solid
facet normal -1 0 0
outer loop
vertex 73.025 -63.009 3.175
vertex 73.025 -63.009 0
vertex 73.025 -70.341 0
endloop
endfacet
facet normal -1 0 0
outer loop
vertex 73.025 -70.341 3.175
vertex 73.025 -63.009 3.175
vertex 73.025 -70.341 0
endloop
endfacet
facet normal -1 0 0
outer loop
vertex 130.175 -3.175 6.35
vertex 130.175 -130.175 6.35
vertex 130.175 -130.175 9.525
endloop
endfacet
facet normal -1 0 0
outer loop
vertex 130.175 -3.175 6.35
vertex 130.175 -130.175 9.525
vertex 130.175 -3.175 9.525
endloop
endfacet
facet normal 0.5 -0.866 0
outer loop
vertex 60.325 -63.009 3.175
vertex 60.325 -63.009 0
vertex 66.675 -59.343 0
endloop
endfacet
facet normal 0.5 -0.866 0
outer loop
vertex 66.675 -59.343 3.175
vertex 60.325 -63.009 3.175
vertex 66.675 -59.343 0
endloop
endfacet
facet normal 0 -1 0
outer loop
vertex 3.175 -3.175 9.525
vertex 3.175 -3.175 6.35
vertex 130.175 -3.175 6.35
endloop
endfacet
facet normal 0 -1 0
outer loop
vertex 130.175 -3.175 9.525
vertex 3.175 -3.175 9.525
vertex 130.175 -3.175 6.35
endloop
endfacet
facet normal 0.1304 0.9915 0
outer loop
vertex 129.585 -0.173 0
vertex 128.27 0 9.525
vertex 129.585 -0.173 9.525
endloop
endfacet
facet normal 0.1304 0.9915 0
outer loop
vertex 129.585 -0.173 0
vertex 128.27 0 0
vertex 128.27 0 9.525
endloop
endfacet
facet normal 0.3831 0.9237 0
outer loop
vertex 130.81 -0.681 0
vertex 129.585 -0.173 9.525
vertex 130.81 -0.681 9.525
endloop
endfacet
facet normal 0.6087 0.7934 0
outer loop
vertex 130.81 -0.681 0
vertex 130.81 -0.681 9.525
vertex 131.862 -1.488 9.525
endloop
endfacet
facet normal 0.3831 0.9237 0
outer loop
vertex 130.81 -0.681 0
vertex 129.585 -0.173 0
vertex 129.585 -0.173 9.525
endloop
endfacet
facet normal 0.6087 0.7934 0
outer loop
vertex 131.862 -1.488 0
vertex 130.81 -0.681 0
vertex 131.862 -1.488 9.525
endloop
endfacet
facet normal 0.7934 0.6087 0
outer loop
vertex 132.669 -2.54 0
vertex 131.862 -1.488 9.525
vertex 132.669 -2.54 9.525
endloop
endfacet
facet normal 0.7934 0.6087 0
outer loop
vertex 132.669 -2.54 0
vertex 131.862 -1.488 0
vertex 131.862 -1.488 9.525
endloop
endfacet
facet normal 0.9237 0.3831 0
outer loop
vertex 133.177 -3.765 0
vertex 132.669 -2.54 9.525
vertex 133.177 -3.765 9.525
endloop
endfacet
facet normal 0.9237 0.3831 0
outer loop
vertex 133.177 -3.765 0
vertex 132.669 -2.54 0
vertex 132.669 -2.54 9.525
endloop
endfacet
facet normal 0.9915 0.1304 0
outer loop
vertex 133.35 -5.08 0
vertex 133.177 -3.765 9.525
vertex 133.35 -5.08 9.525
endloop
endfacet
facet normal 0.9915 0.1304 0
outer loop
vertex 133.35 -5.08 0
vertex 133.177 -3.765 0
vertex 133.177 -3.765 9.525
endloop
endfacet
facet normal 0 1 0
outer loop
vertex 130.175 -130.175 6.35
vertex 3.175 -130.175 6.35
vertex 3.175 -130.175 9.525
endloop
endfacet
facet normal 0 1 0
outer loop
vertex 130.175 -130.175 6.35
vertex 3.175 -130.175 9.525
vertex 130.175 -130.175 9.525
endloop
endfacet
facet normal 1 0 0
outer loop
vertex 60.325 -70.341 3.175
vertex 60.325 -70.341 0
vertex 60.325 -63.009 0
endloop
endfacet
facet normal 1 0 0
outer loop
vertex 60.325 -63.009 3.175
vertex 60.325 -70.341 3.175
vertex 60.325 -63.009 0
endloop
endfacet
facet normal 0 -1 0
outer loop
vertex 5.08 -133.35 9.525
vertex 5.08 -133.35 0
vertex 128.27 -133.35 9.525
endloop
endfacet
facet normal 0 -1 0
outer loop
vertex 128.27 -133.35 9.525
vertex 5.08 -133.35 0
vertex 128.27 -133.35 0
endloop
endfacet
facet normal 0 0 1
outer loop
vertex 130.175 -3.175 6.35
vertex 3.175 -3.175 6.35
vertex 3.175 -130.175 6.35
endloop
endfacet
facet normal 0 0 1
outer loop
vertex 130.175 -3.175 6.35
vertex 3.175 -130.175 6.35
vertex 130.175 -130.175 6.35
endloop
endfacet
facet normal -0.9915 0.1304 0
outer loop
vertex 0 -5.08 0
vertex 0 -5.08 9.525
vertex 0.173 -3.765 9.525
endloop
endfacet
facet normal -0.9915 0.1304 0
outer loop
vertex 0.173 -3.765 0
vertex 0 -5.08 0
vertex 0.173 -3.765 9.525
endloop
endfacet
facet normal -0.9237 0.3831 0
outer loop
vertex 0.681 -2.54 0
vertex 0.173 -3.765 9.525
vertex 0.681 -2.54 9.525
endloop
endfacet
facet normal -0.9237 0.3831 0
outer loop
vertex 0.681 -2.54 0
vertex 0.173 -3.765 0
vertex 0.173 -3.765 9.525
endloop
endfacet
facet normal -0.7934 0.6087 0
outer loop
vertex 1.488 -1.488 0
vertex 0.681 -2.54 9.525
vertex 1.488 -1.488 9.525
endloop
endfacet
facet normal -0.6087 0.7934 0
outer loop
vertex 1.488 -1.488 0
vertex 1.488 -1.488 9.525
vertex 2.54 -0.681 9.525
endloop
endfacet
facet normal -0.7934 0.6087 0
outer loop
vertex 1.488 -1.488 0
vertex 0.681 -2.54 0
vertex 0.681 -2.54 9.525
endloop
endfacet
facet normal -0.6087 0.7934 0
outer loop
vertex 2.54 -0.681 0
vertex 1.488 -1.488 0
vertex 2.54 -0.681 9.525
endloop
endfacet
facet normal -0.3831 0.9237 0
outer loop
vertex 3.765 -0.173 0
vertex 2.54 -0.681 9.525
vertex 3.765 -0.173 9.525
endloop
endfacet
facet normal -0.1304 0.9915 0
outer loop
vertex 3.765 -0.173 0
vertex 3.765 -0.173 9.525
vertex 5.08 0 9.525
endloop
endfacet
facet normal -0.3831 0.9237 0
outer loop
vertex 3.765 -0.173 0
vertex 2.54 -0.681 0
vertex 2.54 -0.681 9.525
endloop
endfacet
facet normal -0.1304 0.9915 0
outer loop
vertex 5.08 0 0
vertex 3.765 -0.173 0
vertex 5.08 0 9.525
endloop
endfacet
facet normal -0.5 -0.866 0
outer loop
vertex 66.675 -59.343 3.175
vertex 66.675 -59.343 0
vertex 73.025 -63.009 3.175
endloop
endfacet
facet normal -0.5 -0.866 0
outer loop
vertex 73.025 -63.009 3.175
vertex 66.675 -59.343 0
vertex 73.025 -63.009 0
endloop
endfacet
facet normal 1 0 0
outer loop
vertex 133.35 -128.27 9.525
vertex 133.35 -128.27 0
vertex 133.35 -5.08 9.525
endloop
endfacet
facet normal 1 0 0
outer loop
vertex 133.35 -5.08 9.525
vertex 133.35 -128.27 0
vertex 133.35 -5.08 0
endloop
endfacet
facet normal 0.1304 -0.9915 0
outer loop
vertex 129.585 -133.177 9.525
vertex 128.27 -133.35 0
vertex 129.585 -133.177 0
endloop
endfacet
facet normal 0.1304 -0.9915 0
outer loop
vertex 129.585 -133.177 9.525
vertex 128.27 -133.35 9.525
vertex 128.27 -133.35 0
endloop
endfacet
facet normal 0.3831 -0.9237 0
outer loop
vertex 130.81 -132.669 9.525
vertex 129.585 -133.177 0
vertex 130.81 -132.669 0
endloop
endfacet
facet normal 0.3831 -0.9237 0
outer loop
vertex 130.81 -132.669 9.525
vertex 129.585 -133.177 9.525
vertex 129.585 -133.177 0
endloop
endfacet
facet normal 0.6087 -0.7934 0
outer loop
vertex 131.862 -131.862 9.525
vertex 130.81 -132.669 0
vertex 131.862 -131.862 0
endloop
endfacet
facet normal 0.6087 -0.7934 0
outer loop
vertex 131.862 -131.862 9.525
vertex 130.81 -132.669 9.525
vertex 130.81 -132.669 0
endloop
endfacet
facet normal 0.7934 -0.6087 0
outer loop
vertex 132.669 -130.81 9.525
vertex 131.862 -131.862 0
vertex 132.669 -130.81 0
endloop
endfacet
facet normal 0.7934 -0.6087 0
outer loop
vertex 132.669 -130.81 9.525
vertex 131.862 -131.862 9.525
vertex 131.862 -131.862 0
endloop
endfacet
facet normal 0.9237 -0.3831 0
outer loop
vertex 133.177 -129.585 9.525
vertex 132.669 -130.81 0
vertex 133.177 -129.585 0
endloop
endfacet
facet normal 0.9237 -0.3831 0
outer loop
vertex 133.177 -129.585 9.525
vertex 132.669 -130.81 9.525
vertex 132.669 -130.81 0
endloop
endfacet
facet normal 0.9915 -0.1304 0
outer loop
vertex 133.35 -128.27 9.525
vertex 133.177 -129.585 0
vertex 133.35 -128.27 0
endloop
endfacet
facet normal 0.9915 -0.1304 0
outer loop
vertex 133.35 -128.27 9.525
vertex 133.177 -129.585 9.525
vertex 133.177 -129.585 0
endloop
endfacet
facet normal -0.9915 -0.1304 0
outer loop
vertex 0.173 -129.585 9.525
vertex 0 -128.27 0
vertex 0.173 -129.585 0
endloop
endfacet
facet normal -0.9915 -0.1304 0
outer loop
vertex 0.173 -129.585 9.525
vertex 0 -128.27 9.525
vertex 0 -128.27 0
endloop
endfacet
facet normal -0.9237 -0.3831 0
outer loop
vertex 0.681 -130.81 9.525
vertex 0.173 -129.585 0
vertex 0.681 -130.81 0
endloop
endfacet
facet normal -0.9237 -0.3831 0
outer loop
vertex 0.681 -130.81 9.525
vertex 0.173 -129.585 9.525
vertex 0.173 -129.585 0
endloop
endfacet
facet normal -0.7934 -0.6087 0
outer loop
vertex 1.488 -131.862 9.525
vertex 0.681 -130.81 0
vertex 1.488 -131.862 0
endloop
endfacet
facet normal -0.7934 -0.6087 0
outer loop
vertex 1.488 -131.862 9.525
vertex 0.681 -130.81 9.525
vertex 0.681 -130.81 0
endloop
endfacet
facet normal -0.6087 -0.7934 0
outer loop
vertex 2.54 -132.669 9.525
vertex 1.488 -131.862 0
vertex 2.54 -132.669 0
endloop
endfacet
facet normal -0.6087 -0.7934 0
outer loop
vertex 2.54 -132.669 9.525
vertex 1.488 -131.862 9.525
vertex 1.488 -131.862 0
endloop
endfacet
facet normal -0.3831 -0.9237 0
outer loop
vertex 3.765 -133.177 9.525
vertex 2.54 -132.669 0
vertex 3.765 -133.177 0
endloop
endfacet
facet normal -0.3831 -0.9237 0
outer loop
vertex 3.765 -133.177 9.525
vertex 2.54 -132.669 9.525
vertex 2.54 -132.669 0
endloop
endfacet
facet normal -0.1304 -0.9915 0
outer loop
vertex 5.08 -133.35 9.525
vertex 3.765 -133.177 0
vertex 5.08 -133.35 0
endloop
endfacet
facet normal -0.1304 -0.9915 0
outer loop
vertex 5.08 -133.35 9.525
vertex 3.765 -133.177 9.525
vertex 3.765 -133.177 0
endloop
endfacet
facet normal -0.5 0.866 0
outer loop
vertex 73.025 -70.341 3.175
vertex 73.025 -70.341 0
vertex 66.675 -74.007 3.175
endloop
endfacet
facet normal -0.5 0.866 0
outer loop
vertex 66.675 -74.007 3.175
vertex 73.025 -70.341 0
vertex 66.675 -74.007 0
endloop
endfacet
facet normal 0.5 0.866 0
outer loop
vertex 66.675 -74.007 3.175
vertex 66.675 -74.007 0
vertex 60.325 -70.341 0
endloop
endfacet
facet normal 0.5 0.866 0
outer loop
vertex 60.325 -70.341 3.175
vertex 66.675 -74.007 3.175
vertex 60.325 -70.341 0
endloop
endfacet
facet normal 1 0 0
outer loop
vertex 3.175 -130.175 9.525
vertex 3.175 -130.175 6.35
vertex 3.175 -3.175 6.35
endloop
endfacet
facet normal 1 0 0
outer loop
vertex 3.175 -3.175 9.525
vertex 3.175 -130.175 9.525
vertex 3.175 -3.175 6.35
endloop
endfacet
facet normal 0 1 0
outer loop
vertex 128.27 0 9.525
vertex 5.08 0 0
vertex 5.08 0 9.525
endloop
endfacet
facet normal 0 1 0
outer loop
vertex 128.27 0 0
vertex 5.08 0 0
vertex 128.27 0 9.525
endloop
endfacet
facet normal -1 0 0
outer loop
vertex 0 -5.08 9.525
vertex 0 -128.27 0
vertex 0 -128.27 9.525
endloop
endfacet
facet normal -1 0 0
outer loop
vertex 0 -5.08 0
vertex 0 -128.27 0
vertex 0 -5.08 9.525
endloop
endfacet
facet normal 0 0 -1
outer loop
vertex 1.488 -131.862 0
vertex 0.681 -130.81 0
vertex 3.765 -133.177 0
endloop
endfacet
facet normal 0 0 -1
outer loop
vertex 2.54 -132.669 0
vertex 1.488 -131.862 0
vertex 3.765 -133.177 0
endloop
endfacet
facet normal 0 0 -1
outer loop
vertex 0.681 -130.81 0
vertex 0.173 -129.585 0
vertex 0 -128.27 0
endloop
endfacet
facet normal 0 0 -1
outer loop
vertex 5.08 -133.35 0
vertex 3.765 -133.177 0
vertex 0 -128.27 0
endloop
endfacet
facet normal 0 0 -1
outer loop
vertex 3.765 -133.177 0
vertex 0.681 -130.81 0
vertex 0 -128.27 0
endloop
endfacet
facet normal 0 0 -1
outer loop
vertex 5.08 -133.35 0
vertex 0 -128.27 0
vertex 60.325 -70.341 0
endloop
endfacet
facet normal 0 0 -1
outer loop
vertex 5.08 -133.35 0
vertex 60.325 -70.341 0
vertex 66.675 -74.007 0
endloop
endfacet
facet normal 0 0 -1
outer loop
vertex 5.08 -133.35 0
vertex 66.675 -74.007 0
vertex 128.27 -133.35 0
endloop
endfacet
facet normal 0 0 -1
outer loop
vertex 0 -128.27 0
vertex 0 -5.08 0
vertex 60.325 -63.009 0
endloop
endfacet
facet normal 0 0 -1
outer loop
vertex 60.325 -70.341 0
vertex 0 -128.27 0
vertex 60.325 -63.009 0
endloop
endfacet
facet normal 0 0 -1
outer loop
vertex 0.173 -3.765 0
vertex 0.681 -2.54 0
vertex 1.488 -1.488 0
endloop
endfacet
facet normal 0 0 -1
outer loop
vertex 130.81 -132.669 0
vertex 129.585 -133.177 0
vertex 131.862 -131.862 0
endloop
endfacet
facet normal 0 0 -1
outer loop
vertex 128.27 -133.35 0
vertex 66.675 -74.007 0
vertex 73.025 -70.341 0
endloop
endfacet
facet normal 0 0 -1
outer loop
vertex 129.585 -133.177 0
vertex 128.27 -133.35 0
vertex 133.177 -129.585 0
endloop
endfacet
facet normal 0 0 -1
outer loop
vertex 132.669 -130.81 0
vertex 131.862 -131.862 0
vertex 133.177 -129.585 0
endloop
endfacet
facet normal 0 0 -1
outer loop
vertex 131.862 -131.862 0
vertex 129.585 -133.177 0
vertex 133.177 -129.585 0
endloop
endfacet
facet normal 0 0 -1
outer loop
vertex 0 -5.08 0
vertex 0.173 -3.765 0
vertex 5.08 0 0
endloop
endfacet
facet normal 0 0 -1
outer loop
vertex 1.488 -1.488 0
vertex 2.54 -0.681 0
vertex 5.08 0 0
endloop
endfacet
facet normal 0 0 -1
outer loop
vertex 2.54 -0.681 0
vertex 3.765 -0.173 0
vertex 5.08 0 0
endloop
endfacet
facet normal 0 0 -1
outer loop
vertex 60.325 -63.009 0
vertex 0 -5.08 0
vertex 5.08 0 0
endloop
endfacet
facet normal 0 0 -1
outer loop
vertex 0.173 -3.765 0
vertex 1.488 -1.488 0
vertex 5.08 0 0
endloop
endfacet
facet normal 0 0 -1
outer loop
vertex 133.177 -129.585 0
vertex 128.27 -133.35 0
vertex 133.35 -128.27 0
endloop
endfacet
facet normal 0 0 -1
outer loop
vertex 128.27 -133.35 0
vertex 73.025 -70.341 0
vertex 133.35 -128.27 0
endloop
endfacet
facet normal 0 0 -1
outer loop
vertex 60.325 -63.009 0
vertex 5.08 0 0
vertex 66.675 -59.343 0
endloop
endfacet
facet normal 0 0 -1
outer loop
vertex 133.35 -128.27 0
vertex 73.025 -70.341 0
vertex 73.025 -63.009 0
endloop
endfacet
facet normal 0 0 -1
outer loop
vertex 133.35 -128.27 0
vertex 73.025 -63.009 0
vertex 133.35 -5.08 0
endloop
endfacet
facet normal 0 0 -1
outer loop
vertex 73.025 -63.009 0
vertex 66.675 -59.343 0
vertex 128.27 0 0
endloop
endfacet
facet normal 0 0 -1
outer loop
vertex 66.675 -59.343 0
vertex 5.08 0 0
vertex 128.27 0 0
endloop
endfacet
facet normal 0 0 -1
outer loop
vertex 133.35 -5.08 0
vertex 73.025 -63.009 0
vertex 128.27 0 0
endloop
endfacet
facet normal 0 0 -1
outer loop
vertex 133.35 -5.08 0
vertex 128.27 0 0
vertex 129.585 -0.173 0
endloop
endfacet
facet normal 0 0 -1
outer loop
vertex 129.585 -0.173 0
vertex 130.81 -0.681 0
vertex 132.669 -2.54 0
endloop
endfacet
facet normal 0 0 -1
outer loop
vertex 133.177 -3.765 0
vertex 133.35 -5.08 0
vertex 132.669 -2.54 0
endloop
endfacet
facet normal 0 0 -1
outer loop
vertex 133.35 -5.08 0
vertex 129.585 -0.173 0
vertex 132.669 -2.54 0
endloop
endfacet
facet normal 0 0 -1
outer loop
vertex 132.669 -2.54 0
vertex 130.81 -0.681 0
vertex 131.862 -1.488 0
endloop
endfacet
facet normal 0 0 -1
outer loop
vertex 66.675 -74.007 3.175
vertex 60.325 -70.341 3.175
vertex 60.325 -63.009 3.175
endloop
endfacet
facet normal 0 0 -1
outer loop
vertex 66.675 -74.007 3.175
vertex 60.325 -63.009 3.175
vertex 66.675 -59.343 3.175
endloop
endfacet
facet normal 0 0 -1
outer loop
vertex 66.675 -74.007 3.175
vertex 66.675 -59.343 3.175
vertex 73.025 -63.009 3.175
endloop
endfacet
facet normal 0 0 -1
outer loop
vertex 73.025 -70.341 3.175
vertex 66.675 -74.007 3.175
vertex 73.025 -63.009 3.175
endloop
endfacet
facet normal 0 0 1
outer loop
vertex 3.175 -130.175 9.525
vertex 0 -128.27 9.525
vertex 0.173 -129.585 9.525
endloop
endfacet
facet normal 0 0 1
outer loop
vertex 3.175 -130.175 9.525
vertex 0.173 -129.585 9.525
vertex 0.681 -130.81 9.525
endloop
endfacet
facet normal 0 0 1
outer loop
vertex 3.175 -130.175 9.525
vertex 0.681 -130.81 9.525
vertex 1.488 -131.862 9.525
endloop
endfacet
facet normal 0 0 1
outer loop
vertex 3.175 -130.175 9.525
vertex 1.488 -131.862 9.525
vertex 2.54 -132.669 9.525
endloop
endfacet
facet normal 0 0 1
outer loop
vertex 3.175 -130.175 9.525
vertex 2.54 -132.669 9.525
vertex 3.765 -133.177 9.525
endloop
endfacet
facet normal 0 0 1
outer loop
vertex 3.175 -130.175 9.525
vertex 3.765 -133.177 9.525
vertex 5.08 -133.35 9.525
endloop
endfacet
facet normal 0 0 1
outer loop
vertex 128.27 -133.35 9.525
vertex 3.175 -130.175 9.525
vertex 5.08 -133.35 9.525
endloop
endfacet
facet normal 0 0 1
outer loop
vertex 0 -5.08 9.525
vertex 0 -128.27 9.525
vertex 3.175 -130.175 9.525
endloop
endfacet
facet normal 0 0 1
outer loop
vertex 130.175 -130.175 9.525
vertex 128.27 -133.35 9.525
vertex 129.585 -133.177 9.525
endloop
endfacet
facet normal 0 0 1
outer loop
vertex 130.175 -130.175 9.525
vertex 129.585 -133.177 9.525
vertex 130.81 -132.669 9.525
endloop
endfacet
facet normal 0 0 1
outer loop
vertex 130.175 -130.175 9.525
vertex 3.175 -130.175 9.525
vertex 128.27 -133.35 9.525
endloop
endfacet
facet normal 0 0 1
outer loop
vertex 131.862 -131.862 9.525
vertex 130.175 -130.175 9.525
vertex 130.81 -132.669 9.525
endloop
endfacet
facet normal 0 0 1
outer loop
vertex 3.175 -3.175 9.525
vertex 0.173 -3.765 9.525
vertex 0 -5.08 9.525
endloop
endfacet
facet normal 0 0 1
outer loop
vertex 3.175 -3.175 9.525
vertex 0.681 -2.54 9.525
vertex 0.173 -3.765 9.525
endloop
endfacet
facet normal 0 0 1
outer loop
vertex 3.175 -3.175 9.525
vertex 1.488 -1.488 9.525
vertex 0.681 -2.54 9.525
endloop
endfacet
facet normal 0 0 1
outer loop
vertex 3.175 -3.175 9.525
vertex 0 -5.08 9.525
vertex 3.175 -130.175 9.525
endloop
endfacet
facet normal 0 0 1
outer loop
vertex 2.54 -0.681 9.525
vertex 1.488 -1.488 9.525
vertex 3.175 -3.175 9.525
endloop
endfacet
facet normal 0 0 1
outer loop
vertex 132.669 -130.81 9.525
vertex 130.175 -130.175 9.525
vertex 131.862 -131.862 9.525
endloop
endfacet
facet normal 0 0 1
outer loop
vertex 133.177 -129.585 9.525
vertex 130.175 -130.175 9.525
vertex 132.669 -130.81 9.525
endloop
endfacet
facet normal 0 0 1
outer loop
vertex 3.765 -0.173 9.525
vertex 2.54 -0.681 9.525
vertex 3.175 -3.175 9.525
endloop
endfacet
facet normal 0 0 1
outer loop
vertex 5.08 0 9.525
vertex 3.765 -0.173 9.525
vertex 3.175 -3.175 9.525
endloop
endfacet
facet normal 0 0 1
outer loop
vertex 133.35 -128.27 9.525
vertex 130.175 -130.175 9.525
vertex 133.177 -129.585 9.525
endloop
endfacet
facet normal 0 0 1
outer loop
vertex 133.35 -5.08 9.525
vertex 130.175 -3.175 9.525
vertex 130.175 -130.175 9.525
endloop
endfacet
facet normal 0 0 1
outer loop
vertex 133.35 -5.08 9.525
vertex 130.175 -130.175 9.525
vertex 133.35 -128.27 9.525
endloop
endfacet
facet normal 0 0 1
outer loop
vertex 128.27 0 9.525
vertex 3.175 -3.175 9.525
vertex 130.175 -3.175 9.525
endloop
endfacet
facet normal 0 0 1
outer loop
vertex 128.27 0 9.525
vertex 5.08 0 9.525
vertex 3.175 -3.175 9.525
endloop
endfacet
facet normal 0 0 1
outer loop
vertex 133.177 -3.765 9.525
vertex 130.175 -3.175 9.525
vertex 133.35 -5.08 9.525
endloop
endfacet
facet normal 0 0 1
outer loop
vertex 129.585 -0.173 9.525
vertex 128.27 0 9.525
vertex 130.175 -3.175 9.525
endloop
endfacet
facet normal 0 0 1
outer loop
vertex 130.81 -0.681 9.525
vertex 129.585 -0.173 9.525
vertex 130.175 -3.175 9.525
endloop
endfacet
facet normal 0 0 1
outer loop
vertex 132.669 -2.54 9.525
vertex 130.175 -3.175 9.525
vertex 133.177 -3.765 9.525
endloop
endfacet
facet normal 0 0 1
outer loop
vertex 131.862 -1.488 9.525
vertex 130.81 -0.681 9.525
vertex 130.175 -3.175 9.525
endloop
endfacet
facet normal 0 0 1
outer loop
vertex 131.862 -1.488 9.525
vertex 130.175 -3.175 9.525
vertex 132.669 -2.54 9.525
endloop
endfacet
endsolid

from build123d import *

# Parameters (mm, degrees)
F0_W     = 133.35
F0_H     = 133.35
F1_DEPTH = 6.35
F2_W     = 133.35
F2_H     = 133.35
F2_W_2   = 127
F2_H_2   = 127
F3_DEPTH = 3.175
F6_DEPTH = 3.175
F7_R     = 5.08


with BuildPart() as f1:
    # F0 (on Top) → F1 (new body)
    with BuildSketch(Plane.XY):
        with Locations((66.675, -66.675)):
            Rectangle(F0_W, F0_H)
    extrude(amount=F1_DEPTH)

    # F2 (on face) → F3 (join)
    with BuildSketch(Plane.XY.offset(6.35)):
        with Locations((66.675, -66.675)):
            Rectangle(F2_W, F2_H)
        with Locations((66.675, -66.675)):
            Rectangle(F2_W_2, F2_H_2, mode=Mode.SUBTRACT)
    extrude(amount=F3_DEPTH)

    # F5 (on face) → F6 (cut)
    with BuildSketch(Plane(origin=(0, 0, 0), x_dir=(1, 0, 0), z_dir=(0, 0, -1))):
        Polygon((73.025, 63.008826), (73.025, 70.341174), (66.675, 74.007348), (60.325, 70.341174), (60.325, 63.008826), (66.675, 59.342652), align=None)
    extrude(amount=-F6_DEPTH, mode=Mode.SUBTRACT)

    # F7
    f7_edges = [f1.edges().sort_by_distance(p)[0] for p in [
        (133.35, -133.35, 4.7625),
        (133.35, 0, 4.7625),
        (0, 0, 4.7625),
        (0, -133.35, 4.7625),
    ]]
    fillet(f7_edges, radius=F7_R)


solid = f1.part
